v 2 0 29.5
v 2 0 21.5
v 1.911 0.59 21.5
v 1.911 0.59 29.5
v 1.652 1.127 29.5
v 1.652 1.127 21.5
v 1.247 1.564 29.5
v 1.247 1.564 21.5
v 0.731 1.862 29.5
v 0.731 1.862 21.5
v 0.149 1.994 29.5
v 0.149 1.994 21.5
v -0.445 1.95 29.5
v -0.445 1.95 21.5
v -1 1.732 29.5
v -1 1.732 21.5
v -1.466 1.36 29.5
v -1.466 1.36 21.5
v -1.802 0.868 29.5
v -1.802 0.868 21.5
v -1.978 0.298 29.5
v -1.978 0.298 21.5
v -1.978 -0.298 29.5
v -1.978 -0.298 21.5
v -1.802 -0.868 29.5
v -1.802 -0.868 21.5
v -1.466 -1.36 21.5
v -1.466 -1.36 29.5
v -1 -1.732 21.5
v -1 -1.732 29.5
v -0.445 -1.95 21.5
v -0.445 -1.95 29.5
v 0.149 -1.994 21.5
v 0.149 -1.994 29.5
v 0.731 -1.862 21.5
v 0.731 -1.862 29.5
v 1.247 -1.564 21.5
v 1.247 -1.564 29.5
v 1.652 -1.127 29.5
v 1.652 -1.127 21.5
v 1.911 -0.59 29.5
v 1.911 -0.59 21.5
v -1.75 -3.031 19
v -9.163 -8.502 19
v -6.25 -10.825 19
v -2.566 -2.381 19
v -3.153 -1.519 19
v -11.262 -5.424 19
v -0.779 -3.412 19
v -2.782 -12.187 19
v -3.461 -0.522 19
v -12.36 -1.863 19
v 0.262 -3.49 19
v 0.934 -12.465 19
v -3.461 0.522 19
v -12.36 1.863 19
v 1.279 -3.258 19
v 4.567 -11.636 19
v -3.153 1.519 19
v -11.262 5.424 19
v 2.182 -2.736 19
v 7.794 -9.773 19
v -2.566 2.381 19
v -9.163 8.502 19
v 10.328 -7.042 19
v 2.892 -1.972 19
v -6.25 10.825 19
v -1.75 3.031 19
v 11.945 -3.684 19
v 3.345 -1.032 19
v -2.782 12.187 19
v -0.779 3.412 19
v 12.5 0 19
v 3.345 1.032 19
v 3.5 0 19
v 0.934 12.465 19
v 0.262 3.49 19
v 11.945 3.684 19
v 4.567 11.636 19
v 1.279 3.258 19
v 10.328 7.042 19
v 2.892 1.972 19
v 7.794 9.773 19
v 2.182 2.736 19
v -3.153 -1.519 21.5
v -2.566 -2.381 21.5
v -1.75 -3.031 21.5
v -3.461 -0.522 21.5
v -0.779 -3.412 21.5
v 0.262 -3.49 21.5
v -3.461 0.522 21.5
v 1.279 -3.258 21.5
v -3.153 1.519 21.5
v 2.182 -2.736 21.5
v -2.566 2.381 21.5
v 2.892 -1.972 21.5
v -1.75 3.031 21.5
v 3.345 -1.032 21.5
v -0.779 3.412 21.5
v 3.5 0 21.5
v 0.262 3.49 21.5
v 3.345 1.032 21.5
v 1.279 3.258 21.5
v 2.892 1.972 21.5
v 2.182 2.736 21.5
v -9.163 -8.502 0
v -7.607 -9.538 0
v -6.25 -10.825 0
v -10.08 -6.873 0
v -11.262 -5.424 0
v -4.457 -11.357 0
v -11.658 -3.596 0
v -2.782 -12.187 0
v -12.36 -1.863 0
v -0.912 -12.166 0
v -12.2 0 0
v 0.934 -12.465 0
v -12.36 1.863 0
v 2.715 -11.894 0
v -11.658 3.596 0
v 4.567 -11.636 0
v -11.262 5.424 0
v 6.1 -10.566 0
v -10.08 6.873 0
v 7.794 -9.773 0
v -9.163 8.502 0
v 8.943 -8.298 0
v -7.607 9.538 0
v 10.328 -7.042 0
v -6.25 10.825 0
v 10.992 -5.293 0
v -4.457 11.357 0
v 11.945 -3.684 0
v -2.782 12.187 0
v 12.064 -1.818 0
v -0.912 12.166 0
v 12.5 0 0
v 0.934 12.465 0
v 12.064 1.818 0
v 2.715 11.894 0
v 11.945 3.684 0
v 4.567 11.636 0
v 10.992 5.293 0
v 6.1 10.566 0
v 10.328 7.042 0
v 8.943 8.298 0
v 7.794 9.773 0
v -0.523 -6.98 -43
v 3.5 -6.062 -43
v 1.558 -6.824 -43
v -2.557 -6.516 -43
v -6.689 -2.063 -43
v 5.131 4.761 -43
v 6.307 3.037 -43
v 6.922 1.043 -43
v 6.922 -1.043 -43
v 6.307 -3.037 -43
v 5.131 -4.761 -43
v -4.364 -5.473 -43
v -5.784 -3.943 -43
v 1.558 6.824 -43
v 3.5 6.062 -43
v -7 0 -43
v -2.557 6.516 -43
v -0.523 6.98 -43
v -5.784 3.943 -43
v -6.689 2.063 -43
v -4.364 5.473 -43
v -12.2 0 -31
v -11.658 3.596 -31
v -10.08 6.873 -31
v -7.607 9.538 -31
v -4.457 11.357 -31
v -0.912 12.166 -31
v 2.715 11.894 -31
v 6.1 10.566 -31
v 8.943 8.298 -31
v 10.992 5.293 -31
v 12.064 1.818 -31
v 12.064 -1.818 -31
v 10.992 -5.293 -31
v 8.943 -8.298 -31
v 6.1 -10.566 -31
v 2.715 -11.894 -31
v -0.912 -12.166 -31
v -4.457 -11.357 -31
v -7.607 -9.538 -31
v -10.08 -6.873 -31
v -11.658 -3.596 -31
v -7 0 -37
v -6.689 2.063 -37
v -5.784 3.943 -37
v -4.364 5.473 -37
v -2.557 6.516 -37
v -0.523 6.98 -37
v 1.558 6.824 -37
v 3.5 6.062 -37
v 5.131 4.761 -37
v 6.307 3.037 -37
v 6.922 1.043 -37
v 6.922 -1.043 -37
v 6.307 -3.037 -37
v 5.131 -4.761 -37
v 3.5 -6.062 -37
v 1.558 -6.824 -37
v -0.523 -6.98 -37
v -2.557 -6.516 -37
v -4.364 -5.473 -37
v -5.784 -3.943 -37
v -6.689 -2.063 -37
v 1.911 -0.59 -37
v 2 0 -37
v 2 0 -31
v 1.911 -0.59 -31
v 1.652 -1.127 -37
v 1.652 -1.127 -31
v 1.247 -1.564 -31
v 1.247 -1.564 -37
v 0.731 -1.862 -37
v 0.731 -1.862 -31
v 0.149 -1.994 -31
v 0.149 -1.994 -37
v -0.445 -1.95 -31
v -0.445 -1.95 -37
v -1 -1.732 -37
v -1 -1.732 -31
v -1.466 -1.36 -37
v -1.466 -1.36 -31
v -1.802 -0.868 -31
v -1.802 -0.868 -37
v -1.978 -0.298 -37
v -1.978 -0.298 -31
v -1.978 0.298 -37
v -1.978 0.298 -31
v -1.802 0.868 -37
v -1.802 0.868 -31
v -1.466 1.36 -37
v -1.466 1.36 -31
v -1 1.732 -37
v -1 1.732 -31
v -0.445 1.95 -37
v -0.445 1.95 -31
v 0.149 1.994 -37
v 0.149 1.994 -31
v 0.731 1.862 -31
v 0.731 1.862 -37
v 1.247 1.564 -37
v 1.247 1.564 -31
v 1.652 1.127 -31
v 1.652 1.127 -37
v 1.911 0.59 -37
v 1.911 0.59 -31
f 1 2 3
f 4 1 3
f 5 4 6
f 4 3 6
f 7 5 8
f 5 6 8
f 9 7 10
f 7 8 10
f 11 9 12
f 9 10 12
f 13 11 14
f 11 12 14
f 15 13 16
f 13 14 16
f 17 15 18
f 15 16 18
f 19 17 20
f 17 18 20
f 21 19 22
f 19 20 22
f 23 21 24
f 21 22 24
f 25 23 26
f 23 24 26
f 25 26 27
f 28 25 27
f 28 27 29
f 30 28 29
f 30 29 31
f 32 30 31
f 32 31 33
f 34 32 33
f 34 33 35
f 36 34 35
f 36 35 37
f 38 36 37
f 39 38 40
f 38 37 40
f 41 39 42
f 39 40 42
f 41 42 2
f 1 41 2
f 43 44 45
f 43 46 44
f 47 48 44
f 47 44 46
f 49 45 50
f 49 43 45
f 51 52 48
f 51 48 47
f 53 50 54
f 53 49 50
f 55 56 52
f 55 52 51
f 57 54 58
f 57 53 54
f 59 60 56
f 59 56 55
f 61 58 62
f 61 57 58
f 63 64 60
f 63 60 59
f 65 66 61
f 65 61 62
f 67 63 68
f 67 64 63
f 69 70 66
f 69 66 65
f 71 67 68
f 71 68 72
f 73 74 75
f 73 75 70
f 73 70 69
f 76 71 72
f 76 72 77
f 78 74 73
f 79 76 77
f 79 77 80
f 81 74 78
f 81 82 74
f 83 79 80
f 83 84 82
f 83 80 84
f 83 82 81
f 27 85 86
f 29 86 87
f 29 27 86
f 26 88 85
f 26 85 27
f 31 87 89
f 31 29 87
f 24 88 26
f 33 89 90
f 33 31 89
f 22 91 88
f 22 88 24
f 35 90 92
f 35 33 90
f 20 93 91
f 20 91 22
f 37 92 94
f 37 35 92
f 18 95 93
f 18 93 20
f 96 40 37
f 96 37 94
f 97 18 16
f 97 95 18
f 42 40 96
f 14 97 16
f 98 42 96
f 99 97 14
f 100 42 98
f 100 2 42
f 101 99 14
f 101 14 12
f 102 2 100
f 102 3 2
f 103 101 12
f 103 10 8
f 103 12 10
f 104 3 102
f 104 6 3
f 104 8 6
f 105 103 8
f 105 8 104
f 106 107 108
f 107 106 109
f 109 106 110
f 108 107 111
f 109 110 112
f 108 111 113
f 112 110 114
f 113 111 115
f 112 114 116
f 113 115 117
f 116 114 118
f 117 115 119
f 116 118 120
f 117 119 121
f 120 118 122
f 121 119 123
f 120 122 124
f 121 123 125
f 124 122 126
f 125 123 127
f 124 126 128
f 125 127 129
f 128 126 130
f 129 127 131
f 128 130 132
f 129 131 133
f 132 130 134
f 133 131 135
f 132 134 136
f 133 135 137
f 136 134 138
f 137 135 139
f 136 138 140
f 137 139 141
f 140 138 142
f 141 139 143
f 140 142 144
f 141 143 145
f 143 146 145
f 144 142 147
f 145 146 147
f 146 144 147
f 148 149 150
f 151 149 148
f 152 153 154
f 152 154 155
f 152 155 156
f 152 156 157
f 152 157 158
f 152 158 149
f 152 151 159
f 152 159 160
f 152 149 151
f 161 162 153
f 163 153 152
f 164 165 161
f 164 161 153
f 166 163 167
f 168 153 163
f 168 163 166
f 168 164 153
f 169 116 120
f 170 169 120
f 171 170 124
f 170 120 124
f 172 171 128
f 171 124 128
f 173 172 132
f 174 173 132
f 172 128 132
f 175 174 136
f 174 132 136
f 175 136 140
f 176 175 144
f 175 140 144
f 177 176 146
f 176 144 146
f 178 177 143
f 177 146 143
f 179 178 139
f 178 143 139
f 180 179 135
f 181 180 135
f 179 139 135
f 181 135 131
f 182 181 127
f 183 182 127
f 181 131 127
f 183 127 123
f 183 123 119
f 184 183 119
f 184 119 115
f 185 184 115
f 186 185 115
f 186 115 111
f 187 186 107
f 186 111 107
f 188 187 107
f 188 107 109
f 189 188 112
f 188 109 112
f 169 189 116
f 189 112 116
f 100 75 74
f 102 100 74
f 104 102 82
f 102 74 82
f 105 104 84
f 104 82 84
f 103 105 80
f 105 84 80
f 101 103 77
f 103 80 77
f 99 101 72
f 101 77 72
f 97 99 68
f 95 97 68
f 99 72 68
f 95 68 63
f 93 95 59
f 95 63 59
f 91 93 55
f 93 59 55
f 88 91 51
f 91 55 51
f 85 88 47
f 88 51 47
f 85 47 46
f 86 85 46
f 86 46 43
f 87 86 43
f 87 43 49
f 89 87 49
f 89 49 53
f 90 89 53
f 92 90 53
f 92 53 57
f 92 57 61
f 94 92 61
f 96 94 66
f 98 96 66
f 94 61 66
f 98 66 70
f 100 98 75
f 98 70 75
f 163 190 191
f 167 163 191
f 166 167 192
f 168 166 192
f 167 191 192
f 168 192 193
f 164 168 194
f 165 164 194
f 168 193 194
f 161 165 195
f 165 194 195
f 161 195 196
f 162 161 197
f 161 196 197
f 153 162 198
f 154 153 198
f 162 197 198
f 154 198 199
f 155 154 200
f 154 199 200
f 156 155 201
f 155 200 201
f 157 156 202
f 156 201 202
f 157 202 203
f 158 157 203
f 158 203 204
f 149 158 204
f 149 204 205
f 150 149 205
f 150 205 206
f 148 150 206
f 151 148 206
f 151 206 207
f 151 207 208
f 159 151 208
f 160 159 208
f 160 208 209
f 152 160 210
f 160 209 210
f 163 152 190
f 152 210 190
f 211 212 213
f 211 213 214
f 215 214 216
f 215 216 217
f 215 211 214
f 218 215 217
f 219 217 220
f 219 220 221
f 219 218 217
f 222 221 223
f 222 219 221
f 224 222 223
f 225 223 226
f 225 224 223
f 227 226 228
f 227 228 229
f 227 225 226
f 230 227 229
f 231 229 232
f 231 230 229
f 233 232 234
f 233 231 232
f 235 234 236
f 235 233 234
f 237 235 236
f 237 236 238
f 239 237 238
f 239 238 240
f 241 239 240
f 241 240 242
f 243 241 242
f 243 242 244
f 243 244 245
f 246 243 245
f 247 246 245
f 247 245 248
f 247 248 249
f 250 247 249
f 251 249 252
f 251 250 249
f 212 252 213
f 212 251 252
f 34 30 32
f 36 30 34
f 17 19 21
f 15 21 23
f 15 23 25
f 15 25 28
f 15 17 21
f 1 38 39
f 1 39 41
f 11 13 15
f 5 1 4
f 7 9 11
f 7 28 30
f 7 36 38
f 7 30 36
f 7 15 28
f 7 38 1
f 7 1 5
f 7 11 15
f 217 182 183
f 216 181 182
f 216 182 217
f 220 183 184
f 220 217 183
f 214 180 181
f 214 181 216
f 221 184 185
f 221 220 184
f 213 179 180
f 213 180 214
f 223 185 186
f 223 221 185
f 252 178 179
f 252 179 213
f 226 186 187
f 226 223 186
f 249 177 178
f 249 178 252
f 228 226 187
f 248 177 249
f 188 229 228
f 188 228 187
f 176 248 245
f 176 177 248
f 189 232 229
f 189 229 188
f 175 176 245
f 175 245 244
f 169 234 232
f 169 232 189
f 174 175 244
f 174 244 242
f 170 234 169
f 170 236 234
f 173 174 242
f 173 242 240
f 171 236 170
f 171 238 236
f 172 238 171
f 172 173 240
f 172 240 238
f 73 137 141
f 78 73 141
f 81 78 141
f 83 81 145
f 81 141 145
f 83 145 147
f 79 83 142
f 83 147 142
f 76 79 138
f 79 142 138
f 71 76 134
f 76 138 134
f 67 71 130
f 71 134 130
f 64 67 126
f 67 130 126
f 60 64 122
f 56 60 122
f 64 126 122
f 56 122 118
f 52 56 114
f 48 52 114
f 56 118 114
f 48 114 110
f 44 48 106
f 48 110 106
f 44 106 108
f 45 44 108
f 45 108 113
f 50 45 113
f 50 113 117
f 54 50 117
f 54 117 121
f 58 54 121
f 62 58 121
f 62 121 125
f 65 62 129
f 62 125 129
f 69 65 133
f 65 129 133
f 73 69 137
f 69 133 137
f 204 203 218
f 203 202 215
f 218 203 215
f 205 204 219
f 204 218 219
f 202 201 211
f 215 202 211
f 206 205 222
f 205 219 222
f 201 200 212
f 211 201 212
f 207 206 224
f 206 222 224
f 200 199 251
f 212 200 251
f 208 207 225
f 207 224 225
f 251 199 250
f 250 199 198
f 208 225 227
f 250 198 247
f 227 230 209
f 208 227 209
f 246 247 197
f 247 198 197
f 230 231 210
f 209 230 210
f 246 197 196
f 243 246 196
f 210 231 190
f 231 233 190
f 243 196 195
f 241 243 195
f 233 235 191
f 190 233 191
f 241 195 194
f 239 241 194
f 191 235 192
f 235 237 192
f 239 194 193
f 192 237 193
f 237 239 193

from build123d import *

# Parameters (mm, degrees)
CROQUIS1_R              = 12.5
SALIENTE_EXTRUIR1_DEPTH = 19
CROQUIS3_R              = 3.5
SALIENTE_EXTRUIR2_DEPTH = 2.5
CROQUIS4_R              = 2
SALIENTE_EXTRUIR3_DEPTH = 8
CROQUIS5_R              = 12.2
SALIENTE_EXTRUIR4_DEPTH = 31
SALIENTE_EXTRUIR5_START = 6
CROQUIS6_R              = 2
SALIENTE_EXTRUIR5_DEPTH = 6
CROQUIS7_R              = 7
SALIENTE_EXTRUIR6_DEPTH = 6


with BuildPart() as part:
    # Croquis1 → Saliente-Extruir1 (new body)
    with BuildSketch(Plane.XY):
        Circle(CROQUIS1_R)
    extrude(amount=SALIENTE_EXTRUIR1_DEPTH)

    # Croquis3 → Saliente-Extruir2 (add)
    with BuildSketch(Plane.XY.offset(19)):
        Circle(CROQUIS3_R)
    extrude(amount=SALIENTE_EXTRUIR2_DEPTH)

    # Croquis4 → Saliente-Extruir3 (add)
    with BuildSketch(Plane.XY.offset(21.5)):
        Circle(CROQUIS4_R)
    extrude(amount=SALIENTE_EXTRUIR3_DEPTH)

    # Croquis5 → Saliente-Extruir4 (add)
    with BuildSketch(Plane(origin=(0, 0, 0), x_dir=(-1, 0, 0), z_dir=(0, 0, -1))):
        Circle(CROQUIS5_R)
    extrude(amount=SALIENTE_EXTRUIR4_DEPTH)

    # Croquis6 → Saliente-Extruir5 (add)
    with BuildSketch(Plane(origin=(0, 0, -31), x_dir=(-1, 0, 0), z_dir=(0, 0, -1)).offset(SALIENTE_EXTRUIR5_START)):
        with Locations(Location((0, 0, 0), (0, 0, 180))):
            Circle(CROQUIS6_R)
    extrude(amount=-SALIENTE_EXTRUIR5_DEPTH)

    # Croquis7 → Saliente-Extruir6 (add)
    with BuildSketch(Plane(origin=(0, 0, -37), x_dir=(-1, 0, 0), z_dir=(0, 0, -1))):
        Circle(CROQUIS7_R)
    extrude(amount=SALIENTE_EXTRUIR6_DEPTH)


solid = part.part
